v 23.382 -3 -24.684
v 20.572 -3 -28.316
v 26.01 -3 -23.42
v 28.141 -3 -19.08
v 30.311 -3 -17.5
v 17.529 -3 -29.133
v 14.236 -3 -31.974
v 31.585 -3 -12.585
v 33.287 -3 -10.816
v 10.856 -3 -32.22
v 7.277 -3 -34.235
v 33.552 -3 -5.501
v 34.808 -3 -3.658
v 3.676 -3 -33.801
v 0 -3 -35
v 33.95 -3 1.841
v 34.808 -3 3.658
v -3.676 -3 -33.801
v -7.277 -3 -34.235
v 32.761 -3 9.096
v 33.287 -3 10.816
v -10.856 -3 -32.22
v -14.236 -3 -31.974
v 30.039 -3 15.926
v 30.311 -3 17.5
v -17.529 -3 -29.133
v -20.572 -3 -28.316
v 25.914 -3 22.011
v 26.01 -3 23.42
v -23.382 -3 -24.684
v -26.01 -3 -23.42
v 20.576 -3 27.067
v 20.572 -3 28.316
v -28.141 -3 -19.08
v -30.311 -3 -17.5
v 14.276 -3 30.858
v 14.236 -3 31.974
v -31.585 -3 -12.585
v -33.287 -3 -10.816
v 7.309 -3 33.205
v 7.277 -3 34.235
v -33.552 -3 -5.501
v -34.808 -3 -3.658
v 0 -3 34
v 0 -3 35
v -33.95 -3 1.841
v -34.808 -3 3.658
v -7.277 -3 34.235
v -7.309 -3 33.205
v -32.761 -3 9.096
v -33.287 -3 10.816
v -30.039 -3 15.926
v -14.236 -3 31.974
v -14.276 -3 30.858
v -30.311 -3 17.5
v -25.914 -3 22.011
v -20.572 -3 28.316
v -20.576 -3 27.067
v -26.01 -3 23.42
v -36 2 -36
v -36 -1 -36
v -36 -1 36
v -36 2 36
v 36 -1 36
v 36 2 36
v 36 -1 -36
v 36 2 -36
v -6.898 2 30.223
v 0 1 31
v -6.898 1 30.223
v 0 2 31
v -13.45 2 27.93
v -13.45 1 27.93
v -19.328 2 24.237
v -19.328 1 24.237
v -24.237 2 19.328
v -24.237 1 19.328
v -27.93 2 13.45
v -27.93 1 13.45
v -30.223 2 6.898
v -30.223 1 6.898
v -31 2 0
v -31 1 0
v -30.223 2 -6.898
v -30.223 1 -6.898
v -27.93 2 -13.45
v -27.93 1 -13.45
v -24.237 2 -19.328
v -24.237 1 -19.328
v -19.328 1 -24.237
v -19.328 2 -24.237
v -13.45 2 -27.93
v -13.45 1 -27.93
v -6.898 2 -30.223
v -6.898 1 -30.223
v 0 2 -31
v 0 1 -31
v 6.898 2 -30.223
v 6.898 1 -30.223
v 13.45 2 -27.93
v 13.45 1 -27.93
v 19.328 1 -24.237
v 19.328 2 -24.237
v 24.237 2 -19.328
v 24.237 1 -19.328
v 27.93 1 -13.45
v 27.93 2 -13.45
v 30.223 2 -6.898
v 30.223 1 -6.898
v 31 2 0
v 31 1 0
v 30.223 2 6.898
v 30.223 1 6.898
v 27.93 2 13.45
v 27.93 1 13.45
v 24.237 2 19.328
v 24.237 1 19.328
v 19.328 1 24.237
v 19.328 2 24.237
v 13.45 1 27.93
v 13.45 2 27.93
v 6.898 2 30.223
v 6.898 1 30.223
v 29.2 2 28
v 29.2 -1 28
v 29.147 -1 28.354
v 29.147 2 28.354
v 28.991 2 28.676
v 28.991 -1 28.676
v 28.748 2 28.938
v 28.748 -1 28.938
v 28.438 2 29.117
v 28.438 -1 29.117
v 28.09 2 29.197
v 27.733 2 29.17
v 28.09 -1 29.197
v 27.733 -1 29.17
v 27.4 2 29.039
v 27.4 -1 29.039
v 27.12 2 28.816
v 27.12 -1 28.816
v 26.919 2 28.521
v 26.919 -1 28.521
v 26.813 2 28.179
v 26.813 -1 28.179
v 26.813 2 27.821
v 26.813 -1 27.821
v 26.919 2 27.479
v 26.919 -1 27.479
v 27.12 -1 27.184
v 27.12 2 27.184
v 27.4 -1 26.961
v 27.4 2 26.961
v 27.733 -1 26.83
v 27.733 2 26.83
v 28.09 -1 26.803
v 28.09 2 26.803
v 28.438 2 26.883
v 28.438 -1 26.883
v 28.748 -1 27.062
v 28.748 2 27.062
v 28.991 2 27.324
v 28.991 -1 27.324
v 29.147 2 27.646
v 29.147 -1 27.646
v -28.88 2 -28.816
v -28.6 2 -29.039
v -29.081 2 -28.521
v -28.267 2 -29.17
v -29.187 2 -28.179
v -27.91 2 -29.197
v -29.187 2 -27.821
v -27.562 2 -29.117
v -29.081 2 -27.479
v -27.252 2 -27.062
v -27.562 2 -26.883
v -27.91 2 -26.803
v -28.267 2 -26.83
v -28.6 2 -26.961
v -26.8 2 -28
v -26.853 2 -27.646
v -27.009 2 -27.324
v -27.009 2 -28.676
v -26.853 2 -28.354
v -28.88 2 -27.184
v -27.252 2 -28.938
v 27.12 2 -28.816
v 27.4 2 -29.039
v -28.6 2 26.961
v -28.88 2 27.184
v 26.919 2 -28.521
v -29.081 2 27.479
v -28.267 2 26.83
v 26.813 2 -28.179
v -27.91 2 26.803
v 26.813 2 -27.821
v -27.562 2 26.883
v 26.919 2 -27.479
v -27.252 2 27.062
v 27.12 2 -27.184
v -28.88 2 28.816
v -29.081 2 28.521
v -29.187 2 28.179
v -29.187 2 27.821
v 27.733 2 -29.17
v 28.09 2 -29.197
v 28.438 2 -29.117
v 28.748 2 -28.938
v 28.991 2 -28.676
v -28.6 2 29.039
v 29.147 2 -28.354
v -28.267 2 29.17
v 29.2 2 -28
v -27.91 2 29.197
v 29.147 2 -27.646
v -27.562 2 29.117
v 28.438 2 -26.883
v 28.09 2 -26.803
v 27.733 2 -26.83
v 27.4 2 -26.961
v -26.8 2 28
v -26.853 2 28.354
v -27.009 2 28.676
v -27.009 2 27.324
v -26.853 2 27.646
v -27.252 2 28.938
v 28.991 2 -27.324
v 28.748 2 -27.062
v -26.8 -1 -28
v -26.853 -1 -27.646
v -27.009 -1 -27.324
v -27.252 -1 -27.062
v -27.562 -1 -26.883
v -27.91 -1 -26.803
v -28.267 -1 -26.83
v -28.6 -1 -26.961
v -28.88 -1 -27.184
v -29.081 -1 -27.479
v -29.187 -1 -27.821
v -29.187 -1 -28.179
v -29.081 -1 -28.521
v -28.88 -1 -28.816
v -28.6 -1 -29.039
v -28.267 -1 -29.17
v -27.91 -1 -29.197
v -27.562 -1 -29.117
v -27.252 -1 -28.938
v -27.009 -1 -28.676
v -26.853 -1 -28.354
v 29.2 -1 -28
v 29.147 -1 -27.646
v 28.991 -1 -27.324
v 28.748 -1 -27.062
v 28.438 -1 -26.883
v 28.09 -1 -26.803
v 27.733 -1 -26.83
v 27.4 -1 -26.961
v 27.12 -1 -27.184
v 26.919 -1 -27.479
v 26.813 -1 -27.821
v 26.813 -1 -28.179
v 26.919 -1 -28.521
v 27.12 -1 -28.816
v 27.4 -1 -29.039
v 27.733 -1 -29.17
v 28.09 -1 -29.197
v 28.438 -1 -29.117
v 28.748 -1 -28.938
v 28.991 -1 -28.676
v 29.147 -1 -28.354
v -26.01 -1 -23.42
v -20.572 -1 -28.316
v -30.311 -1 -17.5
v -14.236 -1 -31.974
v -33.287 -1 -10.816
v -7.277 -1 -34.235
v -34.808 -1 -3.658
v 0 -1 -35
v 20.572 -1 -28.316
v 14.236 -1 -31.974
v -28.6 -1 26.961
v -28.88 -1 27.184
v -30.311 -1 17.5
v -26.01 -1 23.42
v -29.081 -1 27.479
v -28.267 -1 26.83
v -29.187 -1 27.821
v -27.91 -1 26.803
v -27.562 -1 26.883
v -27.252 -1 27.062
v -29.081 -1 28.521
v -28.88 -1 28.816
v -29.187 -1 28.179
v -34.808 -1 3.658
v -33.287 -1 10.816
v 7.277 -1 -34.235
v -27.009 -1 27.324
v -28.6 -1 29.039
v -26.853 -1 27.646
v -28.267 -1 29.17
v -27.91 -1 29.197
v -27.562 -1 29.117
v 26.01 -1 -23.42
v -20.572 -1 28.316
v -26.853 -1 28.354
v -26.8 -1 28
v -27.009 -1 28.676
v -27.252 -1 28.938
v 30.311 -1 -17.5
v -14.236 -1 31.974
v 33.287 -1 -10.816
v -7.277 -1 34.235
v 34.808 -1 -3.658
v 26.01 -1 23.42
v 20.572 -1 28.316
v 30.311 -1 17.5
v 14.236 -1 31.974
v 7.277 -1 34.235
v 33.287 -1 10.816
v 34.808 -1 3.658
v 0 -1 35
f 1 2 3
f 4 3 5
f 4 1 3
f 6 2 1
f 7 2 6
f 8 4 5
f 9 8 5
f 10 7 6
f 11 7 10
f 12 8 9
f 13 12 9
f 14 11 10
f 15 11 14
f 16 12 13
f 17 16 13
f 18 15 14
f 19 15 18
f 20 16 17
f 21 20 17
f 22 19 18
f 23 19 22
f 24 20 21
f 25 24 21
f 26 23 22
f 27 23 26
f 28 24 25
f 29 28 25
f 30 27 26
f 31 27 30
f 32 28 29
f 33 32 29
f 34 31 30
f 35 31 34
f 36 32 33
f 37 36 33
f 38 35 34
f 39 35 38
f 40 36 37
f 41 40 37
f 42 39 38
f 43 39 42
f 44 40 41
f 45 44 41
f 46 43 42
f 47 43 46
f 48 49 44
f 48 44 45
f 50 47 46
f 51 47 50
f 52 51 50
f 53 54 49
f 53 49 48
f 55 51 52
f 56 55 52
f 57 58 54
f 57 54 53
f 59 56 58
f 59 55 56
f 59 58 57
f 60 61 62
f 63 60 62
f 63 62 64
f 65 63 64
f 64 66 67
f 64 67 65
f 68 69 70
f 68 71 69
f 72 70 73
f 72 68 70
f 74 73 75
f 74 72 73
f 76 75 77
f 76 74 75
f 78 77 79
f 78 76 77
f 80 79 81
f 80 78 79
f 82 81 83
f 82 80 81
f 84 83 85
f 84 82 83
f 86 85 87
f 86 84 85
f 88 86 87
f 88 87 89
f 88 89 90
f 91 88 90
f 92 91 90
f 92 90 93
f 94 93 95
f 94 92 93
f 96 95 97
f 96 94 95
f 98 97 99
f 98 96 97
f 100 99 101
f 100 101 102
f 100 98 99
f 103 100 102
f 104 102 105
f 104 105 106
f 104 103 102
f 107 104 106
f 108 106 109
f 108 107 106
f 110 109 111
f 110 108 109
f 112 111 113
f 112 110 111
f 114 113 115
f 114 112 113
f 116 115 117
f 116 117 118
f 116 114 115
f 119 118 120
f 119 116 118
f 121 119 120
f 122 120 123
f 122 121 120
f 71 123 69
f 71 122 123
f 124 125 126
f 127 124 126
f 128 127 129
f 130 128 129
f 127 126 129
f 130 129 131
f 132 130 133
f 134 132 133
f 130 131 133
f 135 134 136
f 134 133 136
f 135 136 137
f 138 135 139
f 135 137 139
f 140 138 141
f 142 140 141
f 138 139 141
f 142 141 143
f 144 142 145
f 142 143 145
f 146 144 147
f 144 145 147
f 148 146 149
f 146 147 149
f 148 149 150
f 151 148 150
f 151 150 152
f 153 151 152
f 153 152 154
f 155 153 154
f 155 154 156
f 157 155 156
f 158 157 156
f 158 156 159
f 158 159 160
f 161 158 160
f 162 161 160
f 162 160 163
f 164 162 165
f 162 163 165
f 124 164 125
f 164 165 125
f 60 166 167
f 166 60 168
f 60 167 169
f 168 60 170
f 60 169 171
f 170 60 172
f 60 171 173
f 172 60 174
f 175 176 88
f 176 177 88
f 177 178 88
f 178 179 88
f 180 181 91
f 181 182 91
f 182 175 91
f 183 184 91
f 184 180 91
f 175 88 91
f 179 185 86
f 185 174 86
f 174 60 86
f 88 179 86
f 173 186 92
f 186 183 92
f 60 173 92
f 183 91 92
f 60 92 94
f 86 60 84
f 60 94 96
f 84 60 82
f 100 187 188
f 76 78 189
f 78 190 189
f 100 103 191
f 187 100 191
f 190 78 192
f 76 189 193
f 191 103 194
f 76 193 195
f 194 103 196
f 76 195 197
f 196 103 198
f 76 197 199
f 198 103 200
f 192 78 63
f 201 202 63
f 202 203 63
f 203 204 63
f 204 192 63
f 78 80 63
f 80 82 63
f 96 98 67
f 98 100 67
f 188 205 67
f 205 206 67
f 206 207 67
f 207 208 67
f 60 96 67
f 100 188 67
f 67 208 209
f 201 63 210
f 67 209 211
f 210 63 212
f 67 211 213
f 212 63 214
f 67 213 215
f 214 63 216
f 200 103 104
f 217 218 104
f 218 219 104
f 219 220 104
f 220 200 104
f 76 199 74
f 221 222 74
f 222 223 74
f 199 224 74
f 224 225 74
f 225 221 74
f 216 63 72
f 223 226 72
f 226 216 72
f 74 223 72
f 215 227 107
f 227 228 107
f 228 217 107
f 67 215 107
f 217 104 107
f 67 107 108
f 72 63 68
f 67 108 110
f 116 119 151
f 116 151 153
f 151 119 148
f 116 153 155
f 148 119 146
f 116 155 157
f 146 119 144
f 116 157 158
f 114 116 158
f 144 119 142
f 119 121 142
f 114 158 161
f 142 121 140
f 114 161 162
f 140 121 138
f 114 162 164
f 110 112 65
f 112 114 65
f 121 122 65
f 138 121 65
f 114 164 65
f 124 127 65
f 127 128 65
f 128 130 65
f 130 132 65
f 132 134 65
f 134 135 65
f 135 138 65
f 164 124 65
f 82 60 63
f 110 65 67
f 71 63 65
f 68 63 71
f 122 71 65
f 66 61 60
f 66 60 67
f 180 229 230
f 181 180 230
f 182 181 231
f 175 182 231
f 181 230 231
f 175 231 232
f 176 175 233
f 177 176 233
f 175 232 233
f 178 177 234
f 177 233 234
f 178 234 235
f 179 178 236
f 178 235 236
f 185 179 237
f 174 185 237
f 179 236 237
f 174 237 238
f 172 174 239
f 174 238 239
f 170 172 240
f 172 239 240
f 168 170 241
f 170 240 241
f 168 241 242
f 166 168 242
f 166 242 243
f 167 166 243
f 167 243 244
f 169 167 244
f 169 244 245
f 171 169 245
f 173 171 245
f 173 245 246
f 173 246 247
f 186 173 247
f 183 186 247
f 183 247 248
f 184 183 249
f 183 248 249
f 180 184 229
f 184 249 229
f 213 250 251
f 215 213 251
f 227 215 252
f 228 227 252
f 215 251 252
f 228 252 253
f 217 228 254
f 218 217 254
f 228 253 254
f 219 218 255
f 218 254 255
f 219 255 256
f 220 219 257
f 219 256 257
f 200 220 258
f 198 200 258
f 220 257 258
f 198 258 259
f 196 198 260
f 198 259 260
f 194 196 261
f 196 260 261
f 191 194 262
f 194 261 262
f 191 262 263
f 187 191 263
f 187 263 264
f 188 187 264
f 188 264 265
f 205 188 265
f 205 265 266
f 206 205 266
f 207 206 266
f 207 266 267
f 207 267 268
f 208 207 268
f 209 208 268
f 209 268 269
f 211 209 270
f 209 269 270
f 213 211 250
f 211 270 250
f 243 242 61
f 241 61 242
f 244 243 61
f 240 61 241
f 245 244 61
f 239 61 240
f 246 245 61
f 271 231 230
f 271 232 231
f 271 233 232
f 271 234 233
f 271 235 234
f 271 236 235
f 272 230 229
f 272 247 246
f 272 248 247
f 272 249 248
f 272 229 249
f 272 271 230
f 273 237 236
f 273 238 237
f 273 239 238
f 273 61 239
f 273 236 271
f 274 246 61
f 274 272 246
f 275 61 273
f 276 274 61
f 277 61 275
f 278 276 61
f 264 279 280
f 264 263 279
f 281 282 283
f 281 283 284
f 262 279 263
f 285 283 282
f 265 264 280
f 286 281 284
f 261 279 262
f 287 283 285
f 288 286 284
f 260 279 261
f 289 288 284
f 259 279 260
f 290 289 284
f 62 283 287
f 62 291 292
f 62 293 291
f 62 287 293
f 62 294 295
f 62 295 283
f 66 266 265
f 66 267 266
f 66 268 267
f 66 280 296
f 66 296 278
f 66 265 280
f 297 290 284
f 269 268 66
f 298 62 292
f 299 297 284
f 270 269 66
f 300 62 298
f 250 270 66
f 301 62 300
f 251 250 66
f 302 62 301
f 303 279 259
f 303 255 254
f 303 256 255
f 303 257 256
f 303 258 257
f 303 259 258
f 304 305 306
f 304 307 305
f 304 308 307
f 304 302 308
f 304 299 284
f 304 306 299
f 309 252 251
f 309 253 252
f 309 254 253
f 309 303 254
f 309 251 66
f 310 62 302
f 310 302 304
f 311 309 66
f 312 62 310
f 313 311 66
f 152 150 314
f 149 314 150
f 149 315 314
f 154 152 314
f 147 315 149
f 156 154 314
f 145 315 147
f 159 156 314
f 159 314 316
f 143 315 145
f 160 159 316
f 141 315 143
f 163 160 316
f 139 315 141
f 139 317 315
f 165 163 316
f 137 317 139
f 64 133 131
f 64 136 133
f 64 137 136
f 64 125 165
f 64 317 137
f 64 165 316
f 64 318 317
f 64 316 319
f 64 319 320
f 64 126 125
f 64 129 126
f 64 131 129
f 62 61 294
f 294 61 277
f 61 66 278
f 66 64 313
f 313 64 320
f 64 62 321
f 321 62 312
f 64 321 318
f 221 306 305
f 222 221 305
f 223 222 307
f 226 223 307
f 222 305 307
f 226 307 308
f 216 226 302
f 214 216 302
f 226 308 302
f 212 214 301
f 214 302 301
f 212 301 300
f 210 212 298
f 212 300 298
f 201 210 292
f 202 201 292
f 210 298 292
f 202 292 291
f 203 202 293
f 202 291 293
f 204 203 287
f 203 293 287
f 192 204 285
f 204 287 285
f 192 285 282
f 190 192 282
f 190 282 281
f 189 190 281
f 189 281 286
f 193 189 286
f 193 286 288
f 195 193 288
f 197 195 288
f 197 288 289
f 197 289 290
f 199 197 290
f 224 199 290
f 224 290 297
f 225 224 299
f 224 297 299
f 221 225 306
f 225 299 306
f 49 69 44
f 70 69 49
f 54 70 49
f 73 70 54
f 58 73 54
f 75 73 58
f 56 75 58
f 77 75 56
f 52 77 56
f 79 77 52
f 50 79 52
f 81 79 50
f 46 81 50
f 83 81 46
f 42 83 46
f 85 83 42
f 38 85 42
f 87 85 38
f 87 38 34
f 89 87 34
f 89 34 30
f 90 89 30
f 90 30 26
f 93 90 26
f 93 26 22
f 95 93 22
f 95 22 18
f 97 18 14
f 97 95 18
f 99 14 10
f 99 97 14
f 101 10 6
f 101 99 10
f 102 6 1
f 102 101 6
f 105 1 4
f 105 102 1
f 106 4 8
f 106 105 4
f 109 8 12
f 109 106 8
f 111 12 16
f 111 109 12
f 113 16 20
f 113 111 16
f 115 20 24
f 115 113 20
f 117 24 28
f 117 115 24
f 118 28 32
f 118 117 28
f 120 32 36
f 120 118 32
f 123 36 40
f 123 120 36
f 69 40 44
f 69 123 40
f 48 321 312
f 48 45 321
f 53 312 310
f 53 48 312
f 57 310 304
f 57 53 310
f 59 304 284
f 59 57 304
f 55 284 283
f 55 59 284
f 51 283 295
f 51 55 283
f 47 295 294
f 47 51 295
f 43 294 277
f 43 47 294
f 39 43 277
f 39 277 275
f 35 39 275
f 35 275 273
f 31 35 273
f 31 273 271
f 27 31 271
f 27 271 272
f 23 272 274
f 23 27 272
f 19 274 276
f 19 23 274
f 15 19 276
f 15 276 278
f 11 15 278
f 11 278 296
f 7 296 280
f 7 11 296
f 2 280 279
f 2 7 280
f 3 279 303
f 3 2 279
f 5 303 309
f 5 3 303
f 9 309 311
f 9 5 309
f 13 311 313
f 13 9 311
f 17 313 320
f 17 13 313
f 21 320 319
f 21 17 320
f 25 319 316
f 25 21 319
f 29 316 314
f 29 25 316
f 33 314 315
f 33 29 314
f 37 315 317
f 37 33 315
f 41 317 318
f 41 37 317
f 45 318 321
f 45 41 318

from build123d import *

# Parameters (mm, degrees)
F3_W     = 72
F3_H     = 72
F3_R     = 1.2
F3_R_2   = 35
F4_DEPTH = 3


with BuildPart() as f1:
    # F0 (on Right) → F1 (revolve)
    with BuildSketch(Plane.YZ):
        Polygon((2, 35), (-3, 35), (-3, 34), (1, 31), (2, 31), align=None)
    revolve(axis=Axis((0, 1.602868, 0), (0, -1, 0)))

    # F3 (on offset) → F4 (join)
    with BuildSketch(Plane.XZ.offset(1)):
        Rectangle(F3_W, F3_H)
        with Locations((-28, -28)):
            Circle(F3_R, mode=Mode.SUBTRACT)
        with Locations((28, -28)):
            Circle(F3_R, mode=Mode.SUBTRACT)
        with Locations((-28, 28)):
            Circle(F3_R, mode=Mode.SUBTRACT)
        Circle(F3_R_2, mode=Mode.SUBTRACT)
        with Locations((28, 28)):
            Circle(F3_R, mode=Mode.SUBTRACT)
    extrude(amount=-F4_DEPTH)


solid = f1.part
